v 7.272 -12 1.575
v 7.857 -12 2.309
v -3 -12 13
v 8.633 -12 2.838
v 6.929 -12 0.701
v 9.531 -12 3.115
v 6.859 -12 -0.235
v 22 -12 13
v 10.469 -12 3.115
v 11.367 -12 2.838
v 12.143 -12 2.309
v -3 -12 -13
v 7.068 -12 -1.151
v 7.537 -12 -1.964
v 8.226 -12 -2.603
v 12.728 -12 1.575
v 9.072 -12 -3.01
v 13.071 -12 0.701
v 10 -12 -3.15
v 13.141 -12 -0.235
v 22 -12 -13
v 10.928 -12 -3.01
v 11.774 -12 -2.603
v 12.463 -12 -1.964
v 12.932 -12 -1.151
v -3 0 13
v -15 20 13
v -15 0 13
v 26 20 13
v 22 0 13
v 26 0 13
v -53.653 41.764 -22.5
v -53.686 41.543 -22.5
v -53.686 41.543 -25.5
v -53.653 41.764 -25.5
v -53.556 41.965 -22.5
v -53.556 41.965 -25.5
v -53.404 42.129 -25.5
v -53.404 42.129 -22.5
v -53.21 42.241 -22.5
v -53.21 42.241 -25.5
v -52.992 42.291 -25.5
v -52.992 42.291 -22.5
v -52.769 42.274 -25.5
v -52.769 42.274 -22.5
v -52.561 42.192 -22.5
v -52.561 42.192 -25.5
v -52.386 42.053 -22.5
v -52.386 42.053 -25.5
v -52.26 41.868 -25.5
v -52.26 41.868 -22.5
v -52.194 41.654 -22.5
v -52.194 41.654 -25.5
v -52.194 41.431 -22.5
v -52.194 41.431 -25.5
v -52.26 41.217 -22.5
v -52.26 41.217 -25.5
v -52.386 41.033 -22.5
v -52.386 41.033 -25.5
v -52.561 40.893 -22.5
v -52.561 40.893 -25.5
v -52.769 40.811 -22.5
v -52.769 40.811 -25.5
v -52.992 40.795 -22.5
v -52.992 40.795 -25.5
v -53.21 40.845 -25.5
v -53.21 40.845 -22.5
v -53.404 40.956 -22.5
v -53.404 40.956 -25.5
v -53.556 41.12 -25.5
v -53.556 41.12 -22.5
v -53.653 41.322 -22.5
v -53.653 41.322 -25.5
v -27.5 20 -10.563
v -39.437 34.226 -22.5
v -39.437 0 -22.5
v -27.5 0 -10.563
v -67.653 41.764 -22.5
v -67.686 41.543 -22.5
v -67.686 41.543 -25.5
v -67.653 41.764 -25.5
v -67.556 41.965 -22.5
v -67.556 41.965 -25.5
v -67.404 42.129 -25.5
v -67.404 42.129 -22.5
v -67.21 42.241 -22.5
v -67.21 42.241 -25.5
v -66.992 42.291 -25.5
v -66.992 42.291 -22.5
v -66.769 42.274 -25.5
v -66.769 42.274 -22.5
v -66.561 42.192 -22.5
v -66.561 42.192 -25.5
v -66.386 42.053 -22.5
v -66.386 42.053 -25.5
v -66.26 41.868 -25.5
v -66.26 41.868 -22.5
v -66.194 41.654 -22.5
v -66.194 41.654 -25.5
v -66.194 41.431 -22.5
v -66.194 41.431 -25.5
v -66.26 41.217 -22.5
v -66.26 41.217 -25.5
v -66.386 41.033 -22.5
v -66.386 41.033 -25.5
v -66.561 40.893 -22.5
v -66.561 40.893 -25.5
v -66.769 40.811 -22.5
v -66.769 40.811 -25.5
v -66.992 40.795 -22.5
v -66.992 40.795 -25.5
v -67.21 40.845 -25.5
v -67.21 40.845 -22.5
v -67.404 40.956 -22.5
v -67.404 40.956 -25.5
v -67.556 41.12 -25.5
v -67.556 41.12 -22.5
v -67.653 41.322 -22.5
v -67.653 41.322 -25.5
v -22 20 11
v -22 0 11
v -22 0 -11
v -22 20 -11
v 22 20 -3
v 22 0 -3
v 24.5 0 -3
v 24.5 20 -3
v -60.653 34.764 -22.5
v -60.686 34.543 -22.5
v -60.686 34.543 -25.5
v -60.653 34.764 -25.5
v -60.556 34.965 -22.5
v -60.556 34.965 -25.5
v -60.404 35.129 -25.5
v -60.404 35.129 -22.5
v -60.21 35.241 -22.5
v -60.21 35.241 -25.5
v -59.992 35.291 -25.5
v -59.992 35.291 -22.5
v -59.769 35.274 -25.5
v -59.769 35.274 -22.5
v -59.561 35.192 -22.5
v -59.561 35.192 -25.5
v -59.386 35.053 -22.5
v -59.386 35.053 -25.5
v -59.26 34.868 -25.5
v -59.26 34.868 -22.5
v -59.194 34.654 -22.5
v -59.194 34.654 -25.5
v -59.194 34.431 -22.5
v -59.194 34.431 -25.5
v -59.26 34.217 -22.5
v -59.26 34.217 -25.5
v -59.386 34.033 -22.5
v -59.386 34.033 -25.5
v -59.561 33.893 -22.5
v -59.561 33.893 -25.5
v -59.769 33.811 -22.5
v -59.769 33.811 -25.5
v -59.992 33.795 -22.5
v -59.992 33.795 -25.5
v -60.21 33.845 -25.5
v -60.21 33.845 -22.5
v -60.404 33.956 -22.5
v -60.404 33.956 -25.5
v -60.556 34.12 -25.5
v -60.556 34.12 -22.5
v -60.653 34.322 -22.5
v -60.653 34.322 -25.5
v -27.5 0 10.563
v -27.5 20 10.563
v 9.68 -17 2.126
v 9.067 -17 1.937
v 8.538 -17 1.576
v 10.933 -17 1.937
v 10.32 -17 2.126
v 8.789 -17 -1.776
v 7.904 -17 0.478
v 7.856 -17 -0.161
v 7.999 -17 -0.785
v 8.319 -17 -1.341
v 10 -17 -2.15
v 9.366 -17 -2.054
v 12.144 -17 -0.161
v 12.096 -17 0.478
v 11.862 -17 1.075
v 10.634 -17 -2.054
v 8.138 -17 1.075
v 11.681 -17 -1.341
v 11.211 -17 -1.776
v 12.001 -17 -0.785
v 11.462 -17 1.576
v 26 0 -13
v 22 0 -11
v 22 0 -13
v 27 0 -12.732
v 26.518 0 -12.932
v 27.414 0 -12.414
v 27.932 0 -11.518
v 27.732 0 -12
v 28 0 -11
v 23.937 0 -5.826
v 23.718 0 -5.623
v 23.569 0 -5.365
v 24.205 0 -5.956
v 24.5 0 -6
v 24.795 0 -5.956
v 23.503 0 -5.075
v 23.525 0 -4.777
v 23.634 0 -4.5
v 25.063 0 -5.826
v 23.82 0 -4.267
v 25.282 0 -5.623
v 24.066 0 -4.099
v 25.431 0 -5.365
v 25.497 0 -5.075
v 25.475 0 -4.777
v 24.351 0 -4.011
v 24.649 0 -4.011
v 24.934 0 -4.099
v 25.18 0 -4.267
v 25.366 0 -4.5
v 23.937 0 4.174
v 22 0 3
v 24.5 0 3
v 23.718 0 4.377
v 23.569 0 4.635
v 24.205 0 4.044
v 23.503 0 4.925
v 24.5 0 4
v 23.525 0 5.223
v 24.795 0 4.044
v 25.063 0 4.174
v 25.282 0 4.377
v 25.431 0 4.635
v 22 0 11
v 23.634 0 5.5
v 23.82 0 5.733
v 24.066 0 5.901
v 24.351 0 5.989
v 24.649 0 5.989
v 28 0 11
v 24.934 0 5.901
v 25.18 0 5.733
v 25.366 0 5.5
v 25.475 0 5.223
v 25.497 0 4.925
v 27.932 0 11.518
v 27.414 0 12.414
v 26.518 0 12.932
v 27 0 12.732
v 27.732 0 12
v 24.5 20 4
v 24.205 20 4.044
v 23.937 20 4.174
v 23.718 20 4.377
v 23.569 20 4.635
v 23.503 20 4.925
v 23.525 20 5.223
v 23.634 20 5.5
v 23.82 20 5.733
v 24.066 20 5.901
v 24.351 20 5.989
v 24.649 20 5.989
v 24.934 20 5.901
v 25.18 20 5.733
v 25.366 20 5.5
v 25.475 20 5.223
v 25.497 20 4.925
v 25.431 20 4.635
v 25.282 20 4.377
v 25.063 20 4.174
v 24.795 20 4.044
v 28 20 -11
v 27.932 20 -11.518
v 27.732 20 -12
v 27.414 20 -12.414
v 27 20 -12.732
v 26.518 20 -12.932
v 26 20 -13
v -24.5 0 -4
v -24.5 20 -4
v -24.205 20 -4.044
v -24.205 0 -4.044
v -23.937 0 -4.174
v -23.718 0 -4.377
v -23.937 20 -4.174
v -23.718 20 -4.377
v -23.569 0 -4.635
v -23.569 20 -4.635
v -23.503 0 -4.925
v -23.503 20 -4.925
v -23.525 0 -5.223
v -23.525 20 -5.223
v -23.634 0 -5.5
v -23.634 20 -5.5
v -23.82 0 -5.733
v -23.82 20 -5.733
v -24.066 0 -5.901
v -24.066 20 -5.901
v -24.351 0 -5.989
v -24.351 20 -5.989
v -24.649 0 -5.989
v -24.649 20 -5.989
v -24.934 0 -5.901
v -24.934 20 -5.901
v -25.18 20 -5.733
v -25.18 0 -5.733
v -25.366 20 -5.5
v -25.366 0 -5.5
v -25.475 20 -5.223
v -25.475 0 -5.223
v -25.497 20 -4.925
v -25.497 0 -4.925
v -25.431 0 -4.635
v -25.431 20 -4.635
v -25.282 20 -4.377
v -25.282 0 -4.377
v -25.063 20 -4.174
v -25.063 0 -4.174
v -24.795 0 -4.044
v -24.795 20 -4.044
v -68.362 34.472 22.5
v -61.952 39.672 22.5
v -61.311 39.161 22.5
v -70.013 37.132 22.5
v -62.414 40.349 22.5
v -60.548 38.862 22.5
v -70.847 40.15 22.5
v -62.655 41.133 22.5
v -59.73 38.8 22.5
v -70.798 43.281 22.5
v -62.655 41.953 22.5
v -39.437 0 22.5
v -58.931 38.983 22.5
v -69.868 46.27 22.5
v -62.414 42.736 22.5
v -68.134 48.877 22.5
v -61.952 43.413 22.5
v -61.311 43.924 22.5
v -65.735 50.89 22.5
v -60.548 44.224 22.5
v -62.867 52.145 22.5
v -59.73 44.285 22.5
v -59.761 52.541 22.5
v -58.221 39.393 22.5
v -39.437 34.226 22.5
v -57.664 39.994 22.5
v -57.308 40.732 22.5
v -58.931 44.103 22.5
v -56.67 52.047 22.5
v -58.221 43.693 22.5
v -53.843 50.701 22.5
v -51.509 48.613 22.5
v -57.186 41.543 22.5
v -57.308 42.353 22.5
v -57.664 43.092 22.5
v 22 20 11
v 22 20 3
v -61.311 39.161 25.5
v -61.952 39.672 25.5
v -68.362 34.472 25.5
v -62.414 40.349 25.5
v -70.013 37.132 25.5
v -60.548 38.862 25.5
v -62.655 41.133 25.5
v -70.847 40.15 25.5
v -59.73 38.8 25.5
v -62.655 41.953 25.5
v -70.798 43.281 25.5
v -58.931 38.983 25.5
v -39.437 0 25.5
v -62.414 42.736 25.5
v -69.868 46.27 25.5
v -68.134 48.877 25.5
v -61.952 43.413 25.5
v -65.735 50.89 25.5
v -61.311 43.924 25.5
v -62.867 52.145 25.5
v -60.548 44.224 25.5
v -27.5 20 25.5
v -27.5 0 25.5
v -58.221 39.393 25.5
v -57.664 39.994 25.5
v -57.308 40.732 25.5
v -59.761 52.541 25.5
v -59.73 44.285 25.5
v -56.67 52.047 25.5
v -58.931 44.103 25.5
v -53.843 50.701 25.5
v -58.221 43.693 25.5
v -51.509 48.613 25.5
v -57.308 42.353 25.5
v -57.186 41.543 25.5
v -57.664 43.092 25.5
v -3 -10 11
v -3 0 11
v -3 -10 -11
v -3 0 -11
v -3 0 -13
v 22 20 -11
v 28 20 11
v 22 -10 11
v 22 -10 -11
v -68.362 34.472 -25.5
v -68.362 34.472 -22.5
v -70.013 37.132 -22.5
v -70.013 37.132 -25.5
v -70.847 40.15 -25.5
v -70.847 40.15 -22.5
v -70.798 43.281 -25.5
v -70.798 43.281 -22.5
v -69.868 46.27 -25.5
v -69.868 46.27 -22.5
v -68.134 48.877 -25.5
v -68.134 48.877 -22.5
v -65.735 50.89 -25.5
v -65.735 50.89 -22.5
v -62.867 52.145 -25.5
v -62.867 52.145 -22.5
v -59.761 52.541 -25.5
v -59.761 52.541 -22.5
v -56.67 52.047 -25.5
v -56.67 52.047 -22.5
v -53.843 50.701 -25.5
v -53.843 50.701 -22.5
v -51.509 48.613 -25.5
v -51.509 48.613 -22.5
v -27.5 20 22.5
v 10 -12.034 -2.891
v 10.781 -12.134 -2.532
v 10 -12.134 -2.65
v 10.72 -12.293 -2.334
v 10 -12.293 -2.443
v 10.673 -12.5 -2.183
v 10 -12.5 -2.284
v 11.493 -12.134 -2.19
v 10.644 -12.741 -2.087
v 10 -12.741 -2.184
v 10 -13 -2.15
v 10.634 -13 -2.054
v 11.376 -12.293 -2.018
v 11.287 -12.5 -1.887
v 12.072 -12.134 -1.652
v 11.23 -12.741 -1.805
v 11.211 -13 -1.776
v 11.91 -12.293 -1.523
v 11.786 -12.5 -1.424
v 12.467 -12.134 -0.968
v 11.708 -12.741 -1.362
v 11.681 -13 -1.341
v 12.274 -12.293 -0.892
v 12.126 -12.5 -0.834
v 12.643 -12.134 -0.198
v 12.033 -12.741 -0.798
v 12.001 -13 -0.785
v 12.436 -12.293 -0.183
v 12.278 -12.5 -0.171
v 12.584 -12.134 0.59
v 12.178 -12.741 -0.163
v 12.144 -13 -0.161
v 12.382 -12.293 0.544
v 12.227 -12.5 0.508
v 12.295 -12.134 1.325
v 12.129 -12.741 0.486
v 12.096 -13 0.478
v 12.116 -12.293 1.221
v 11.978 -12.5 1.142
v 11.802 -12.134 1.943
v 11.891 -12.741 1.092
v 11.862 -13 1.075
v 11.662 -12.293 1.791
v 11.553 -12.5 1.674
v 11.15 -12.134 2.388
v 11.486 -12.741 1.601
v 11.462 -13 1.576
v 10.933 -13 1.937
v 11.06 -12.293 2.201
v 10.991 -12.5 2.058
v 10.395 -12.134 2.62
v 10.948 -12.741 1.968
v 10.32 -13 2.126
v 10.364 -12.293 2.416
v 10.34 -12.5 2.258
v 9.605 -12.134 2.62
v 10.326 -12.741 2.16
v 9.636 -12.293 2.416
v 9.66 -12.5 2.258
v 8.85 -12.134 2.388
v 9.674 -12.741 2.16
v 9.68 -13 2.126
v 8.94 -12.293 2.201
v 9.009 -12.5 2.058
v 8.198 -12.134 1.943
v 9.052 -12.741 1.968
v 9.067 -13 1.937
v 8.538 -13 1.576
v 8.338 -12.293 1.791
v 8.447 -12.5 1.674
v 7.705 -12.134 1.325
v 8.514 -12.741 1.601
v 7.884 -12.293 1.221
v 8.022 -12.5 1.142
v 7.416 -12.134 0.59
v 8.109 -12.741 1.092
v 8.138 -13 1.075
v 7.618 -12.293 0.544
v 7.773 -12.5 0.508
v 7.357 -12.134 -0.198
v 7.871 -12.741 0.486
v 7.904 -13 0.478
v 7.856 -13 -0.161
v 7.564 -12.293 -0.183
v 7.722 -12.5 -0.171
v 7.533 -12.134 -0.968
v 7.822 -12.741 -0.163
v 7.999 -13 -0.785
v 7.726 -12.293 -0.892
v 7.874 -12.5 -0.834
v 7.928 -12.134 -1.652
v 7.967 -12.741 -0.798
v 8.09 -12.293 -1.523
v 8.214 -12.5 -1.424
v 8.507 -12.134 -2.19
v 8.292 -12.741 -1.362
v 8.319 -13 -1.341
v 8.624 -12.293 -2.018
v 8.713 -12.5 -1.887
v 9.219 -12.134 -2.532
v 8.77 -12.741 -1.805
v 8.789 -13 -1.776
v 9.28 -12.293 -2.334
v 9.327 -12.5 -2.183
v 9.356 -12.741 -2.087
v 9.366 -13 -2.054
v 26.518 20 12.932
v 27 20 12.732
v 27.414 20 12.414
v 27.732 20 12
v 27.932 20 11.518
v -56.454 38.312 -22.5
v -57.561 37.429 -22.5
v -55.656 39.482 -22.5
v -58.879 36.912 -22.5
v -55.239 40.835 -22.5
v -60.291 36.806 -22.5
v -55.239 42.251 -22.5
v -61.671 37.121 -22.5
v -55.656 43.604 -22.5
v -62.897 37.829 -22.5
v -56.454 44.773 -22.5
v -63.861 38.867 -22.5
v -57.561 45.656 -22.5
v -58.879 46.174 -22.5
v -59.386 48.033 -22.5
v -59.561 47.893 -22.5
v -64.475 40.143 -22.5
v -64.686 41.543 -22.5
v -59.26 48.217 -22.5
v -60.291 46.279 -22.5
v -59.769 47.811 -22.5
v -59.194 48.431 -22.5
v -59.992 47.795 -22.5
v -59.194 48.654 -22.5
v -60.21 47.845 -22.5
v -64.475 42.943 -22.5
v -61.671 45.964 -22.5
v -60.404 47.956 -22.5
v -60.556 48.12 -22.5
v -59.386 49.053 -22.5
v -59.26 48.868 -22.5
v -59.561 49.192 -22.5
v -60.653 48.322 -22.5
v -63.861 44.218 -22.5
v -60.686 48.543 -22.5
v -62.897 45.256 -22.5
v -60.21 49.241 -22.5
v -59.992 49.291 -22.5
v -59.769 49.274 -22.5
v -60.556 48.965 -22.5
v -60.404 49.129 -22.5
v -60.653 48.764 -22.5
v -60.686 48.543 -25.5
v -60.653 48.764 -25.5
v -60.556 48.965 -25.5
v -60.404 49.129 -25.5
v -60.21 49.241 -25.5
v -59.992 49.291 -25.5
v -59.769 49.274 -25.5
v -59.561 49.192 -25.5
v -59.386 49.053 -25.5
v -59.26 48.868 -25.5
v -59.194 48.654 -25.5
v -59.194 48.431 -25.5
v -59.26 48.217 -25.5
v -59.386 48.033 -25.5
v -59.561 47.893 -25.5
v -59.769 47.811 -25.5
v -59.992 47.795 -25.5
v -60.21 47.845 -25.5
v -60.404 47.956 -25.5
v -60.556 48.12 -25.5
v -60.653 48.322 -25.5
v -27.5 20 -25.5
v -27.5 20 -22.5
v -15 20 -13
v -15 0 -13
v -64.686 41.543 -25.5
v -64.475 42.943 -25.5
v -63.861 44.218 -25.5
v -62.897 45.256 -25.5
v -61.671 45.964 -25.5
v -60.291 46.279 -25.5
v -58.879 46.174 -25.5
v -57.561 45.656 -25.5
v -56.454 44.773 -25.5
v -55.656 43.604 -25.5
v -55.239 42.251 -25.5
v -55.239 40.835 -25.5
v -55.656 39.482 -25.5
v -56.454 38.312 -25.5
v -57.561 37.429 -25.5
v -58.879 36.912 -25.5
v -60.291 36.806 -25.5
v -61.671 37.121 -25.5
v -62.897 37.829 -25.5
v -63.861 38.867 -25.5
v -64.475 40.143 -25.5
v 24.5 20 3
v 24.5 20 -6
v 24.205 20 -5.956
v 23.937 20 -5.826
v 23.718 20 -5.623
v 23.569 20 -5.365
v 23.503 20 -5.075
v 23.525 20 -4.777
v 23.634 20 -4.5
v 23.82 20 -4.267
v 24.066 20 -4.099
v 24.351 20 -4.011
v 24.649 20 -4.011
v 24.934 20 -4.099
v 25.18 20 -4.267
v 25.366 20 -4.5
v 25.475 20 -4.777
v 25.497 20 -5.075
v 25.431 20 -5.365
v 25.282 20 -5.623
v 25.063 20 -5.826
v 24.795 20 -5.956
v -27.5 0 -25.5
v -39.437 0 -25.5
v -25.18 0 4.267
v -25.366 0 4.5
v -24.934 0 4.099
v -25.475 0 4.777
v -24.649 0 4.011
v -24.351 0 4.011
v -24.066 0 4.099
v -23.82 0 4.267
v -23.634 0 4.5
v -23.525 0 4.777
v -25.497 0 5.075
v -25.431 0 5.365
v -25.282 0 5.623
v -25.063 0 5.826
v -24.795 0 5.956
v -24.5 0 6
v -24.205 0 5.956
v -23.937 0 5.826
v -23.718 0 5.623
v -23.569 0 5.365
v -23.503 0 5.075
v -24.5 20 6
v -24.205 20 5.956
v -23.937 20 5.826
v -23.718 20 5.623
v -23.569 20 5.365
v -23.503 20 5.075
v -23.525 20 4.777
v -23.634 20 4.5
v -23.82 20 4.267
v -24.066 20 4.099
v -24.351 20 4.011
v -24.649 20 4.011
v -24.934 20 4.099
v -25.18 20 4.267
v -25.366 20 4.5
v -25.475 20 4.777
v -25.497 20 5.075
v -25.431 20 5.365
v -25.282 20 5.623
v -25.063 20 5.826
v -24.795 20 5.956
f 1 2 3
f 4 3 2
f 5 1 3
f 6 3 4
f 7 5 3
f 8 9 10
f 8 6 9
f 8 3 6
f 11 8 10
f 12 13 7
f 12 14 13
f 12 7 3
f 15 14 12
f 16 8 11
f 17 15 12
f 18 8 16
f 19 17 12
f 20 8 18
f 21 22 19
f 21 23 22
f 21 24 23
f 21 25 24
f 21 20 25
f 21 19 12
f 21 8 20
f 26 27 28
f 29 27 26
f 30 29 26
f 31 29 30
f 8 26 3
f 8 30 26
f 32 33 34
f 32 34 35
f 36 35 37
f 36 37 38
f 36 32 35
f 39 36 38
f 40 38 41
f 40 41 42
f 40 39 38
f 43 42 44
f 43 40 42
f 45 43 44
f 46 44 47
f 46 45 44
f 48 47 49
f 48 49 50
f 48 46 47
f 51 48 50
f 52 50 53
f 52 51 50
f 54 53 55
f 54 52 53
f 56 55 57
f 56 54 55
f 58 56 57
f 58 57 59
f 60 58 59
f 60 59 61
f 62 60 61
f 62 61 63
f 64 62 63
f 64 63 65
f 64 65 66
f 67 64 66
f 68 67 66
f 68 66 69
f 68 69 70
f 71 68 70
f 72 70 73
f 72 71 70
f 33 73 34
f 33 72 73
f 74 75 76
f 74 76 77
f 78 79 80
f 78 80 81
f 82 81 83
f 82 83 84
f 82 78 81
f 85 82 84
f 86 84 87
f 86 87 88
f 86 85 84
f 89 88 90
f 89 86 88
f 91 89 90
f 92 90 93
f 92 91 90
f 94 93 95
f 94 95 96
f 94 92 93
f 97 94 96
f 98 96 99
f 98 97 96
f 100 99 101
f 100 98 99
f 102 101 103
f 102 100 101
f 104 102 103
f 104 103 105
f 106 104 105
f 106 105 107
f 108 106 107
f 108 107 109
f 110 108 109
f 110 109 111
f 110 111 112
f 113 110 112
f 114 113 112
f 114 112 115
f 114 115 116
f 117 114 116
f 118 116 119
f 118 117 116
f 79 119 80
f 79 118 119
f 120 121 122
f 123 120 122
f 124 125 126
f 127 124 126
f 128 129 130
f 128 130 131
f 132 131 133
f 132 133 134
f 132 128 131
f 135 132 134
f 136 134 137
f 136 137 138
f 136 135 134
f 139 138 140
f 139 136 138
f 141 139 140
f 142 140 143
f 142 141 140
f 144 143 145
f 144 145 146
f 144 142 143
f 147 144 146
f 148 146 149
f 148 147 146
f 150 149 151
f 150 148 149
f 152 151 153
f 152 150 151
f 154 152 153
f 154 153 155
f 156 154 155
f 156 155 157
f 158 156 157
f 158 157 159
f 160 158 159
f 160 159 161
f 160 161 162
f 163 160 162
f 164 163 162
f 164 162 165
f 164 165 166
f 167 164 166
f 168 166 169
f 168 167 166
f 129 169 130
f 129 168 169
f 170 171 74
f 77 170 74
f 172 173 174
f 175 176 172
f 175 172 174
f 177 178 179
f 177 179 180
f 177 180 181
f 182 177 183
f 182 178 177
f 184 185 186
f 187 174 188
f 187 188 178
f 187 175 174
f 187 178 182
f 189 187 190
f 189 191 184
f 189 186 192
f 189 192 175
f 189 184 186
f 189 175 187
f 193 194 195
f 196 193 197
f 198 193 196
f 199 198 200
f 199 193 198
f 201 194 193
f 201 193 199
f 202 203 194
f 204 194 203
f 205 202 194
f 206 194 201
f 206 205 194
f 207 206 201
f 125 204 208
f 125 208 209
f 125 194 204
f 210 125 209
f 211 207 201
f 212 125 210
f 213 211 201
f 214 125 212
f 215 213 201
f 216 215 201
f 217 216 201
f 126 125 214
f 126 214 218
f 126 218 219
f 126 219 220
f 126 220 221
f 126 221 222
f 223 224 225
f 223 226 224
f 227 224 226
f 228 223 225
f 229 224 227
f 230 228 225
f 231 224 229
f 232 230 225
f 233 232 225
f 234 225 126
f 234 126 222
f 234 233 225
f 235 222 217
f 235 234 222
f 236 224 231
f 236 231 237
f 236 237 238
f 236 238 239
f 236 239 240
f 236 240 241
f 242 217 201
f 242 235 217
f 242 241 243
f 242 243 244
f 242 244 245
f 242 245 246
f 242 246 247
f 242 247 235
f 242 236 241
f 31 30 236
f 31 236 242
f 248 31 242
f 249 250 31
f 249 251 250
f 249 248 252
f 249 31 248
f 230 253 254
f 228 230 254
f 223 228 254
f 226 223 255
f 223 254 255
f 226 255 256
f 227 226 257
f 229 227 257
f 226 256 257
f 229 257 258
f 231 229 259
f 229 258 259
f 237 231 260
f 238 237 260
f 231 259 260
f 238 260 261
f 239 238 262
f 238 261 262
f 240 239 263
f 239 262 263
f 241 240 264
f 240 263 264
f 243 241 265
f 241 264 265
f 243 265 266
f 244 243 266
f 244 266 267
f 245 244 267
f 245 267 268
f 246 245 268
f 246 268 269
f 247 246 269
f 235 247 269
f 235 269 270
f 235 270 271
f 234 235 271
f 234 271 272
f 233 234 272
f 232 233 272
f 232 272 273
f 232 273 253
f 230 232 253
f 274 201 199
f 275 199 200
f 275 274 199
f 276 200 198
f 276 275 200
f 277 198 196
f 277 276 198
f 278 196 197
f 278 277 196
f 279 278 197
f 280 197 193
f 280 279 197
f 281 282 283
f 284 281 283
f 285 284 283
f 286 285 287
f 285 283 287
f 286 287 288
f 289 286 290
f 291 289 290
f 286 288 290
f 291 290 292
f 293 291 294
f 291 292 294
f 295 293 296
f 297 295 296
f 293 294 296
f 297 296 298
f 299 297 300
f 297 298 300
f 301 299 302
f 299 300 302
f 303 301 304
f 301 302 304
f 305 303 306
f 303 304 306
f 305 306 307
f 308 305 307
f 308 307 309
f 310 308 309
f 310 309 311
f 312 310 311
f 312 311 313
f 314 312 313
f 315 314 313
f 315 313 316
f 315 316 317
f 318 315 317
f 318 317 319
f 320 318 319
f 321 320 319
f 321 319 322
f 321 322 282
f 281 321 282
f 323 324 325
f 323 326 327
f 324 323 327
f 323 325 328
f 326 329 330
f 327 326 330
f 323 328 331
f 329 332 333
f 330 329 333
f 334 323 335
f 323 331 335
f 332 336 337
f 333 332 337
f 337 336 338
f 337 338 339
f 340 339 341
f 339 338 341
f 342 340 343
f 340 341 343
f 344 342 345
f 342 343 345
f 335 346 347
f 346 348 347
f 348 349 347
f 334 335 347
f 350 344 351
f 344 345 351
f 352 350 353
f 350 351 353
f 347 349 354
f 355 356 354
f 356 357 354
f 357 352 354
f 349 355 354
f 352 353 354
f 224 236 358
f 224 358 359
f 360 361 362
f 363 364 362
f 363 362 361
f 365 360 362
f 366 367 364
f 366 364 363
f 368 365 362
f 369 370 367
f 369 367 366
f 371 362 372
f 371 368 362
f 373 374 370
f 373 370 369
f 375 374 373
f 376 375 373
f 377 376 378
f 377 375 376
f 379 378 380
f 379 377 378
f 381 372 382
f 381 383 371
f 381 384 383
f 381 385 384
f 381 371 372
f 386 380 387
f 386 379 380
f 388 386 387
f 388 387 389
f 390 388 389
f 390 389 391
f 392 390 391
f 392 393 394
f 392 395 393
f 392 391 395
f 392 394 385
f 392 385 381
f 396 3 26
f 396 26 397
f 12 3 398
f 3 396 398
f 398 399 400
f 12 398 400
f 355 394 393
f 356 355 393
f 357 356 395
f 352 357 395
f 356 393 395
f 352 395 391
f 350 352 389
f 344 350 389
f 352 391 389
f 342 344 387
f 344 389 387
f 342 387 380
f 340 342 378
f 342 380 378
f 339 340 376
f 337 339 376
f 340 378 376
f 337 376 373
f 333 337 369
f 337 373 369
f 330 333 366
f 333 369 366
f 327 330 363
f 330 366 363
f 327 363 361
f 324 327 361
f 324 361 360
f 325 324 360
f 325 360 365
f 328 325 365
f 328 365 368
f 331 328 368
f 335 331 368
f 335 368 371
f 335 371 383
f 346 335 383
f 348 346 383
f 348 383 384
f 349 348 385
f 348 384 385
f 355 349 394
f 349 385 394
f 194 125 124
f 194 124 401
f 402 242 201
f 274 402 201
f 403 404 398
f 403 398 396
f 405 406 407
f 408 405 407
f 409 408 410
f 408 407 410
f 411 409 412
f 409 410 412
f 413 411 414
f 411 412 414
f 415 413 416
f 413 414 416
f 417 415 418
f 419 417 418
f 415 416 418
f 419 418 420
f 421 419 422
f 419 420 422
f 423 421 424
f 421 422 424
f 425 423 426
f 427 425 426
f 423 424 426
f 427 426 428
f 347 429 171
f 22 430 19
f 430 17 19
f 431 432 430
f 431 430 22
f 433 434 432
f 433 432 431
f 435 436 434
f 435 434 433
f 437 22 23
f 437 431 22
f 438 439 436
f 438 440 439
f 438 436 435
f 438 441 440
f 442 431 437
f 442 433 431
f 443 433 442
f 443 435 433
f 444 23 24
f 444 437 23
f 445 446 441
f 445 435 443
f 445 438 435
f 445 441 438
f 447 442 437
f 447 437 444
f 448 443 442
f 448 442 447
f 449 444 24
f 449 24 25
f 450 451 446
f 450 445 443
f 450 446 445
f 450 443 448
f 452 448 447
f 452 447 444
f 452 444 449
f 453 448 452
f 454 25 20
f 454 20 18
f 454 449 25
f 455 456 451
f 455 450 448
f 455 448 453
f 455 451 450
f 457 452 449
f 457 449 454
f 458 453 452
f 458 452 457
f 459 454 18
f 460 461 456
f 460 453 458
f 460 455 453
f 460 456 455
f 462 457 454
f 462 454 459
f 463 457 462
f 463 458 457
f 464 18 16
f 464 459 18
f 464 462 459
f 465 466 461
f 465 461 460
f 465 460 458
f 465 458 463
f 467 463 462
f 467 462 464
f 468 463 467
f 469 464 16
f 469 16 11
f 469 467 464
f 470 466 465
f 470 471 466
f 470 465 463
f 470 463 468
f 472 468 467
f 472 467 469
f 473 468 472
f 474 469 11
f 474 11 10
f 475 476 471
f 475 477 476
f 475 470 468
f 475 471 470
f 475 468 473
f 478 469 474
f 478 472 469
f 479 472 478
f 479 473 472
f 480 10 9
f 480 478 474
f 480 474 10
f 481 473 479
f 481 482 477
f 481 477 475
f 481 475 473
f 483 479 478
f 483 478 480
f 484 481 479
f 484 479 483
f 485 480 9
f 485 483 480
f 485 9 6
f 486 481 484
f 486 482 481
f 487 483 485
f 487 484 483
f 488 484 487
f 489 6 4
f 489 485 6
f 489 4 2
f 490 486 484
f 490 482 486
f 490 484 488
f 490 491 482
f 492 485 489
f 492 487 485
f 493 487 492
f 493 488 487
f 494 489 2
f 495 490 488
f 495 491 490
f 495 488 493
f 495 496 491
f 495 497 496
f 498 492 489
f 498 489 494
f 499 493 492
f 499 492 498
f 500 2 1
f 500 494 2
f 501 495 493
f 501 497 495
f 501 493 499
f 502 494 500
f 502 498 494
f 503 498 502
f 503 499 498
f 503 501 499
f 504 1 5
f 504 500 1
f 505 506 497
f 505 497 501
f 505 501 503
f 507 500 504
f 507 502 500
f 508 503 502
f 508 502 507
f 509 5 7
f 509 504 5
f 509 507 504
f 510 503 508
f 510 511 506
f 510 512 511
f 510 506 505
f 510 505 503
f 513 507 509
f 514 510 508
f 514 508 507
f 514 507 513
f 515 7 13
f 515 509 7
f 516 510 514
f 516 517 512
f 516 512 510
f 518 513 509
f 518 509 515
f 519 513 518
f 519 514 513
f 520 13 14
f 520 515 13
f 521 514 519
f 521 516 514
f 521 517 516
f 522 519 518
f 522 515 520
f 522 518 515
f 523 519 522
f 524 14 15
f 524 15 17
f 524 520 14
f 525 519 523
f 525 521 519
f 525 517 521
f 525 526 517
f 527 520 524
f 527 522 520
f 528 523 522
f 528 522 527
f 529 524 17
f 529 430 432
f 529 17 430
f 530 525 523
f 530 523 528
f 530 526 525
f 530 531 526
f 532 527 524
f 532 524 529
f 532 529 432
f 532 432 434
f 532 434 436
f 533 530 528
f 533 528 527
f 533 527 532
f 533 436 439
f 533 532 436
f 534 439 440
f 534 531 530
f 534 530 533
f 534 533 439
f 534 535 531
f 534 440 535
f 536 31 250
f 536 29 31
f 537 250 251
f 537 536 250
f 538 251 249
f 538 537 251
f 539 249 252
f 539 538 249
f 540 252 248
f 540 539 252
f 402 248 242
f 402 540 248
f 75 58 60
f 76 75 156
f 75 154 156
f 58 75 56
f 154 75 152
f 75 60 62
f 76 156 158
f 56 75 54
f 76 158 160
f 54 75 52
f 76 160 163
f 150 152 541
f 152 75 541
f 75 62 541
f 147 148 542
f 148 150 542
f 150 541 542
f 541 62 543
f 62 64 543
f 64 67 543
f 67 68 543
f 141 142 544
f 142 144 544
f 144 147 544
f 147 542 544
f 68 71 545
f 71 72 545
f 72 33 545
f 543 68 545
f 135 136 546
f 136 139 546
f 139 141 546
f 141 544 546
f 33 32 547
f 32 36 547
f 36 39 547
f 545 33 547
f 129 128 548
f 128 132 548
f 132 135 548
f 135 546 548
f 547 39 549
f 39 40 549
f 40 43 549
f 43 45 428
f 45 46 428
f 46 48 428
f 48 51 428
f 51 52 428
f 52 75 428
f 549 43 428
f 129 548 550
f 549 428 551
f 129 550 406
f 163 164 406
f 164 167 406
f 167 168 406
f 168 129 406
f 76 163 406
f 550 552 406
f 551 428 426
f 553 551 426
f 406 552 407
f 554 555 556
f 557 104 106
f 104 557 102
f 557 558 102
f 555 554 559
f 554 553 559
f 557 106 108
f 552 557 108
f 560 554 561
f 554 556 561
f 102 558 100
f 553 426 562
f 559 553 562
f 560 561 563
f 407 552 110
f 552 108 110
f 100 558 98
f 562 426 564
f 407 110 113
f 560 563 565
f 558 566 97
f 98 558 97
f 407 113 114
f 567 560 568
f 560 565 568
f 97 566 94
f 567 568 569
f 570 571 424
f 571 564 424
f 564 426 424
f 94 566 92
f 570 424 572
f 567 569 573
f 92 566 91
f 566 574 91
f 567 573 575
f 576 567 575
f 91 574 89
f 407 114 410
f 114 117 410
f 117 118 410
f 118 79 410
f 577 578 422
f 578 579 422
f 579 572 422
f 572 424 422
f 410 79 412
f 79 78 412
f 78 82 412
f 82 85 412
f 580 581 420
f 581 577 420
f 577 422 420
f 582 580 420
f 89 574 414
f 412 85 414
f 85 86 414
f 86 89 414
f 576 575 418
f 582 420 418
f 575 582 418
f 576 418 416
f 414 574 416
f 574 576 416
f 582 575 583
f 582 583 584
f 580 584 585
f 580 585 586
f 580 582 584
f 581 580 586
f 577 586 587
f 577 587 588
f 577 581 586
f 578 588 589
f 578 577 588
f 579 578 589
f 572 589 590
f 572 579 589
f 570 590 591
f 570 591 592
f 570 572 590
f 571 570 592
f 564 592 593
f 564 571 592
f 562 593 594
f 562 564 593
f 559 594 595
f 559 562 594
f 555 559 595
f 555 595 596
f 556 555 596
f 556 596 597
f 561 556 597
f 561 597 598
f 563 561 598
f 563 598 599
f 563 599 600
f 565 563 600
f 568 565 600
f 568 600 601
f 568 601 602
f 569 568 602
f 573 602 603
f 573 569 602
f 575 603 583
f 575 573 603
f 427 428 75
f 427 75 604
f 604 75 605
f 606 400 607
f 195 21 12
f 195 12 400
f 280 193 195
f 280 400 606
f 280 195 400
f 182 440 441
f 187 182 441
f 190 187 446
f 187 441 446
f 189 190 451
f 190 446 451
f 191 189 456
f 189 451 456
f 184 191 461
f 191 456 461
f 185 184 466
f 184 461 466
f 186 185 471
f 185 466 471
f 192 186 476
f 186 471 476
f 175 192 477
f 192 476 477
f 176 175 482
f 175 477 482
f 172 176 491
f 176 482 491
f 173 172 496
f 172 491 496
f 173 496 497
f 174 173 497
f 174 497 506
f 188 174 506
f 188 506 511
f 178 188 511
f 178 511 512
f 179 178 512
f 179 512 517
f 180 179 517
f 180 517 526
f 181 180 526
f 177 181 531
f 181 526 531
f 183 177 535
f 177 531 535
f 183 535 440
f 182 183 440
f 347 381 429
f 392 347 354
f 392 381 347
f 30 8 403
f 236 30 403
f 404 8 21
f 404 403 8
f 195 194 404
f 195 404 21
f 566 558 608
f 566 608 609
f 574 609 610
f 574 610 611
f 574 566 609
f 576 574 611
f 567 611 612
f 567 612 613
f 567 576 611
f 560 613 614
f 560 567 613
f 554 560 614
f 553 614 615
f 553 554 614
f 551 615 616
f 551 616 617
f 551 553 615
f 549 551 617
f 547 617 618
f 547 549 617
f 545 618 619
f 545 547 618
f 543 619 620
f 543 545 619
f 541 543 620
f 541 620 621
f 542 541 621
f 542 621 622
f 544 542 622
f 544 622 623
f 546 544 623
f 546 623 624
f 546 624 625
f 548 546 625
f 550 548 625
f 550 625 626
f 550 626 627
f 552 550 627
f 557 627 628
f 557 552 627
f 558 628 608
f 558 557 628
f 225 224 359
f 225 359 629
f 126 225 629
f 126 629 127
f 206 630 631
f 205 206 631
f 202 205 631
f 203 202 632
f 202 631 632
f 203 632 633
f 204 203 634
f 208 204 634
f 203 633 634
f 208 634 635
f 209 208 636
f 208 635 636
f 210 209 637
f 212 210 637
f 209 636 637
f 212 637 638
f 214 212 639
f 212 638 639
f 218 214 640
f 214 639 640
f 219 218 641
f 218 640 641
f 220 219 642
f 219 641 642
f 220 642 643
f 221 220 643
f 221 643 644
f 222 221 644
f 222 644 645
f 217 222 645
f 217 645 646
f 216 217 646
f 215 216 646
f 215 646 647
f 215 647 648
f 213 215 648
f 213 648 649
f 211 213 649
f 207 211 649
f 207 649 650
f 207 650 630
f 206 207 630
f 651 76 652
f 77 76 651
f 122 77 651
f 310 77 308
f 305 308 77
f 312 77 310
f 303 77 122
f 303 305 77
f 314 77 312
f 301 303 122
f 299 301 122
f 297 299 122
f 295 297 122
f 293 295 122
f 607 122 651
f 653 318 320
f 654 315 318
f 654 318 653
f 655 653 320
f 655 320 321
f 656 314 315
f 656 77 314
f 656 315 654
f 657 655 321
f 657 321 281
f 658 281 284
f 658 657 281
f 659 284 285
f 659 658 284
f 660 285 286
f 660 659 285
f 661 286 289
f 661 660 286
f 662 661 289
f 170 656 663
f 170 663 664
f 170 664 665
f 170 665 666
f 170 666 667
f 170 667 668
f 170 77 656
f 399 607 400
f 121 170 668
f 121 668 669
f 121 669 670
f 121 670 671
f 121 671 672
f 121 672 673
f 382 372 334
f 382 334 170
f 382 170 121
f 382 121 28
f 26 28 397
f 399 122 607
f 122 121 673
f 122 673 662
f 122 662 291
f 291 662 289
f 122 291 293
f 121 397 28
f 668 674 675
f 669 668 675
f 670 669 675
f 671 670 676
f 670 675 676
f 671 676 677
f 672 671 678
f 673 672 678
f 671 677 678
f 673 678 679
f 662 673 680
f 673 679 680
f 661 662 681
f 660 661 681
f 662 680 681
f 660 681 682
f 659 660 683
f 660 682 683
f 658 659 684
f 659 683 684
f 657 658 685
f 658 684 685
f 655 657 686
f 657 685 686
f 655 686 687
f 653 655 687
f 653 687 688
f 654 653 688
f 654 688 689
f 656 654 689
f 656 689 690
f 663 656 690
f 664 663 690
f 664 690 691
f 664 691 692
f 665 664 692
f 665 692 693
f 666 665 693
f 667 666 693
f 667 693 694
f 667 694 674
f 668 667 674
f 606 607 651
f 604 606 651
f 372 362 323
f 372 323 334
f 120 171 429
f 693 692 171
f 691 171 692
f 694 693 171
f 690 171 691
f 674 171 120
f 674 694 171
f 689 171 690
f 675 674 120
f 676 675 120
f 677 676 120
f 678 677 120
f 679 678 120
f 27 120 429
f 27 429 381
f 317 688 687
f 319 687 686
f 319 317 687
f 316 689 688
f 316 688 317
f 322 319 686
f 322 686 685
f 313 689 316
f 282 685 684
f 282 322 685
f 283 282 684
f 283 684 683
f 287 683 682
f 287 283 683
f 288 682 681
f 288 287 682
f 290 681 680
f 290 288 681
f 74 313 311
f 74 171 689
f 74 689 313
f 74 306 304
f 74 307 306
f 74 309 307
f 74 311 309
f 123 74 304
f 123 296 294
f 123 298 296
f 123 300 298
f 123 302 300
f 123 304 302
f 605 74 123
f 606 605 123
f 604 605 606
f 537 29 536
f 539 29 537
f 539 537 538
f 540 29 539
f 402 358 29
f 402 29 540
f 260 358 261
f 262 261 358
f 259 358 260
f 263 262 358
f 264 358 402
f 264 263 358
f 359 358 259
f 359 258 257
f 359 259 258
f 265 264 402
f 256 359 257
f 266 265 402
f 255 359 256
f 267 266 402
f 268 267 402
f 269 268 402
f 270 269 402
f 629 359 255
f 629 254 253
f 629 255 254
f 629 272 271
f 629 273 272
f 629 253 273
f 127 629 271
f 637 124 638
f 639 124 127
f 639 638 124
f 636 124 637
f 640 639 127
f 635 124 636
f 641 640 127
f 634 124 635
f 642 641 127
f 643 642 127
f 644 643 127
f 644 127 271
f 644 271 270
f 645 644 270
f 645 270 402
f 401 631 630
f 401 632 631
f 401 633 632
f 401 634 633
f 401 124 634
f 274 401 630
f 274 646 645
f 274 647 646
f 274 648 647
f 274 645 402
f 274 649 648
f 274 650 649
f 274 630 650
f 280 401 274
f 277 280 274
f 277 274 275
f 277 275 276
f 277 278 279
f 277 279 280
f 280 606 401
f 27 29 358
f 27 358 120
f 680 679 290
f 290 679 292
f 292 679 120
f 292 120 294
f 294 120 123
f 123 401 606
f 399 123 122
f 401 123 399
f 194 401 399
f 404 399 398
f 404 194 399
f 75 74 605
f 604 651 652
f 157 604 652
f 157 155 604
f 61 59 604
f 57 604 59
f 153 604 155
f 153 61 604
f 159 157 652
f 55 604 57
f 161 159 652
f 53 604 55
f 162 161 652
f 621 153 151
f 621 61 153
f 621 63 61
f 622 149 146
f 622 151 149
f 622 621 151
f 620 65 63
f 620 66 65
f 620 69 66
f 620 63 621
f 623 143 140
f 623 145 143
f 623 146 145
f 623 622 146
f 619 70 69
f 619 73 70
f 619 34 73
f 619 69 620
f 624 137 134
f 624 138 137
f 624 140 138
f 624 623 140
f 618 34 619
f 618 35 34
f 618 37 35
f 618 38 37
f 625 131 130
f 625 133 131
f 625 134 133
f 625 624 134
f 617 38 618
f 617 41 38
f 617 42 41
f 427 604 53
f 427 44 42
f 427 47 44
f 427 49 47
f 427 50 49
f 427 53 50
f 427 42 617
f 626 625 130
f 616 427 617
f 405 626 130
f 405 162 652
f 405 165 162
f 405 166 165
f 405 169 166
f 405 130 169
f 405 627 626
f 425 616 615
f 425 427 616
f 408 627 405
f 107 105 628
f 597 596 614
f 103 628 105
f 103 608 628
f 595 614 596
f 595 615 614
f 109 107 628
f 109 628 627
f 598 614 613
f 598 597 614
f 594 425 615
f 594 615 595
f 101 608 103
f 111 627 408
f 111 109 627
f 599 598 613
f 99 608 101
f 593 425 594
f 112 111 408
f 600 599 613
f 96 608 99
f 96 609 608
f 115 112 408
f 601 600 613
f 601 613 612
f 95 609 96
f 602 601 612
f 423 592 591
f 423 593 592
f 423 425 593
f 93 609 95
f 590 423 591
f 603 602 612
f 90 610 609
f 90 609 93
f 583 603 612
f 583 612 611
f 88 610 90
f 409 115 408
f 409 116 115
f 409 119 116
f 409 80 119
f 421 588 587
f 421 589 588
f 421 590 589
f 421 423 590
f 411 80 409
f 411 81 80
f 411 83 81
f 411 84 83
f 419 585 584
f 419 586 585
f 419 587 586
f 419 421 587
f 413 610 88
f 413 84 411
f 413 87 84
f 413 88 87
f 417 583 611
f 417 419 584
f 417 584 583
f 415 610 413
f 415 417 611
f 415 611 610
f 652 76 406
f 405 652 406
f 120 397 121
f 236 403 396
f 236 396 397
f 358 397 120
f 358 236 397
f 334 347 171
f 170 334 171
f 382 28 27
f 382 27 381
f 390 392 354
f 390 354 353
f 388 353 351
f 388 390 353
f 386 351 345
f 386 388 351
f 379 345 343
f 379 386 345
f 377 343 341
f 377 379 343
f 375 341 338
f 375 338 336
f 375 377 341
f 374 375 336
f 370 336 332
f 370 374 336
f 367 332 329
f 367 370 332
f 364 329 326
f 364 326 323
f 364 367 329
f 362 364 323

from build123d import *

# Parameters (mm, degrees)
CROQUIS2_W              = 58
CROQUIS2_H              = 26
CROQUIS2_W_2            = 44
CROQUIS2_H_2            = 22
SALIENTE_EXTRUIR3_DEPTH = 20
CROQUIS4_R              = 1
CROQUIS4_W              = 2.5
CROQUIS4_H              = 6
CUT_EXTRUDE1_DEPTH      = 39.327535793
SKETCH1_W               = 51
SKETCH1_H               = 20
BOSS_EXTRUDE1_DEPTH     = 2.5
CROQUIS6_R              = 2.75
SALIENTE_EXTRUIR5_DEPTH = 3
BOSS_EXTRUDE2_START     = -3
SKETCH3_R               = 0.75
SKETCH3_R_2             = 4.75
BOSS_EXTRUDE2_DEPTH     = 3
BOSS_EXTRUDE3_DEPTH     = 25
FILLET1_R               = 2
SKETCH6_R               = 2.15
BOSS_EXTRUDE4_DEPTH     = 5
FILLET4_R               = 1
BOSS_EXTRUDE5_DEPTH     = 20
BOSS_EXTRUDE6_REACH     = 93.885
CUT_EXTRUDE2_DEPTH      = 84.971155352


with BuildPart() as part:
    # Croquis2 → Saliente-Extruir3 (new body)
    with BuildSketch(Plane(origin=(0, 0, 0), x_dir=(1, 0, 0), z_dir=(0, 1, 0))):
        with Locations((-1, 0)):
            Rectangle(CROQUIS2_W, CROQUIS2_H)
        Rectangle(CROQUIS2_W_2, CROQUIS2_H_2, mode=Mode.SUBTRACT)
    extrude(amount=SALIENTE_EXTRUIR3_DEPTH)

    # Croquis4 → Cut-Extrude1 (cut, through all)
    with BuildSketch(Plane(origin=(0, 20, 0), x_dir=(1, 0, 0), z_dir=(0, 1, 0))):
        with Locations(Location((-24.5, 5, 0), (0, 0, 270))):
            Circle(CROQUIS4_R)
        with Locations(Location((-24.5, -5, 0), (0, 0, 270))):
            Circle(CROQUIS4_R)
        with Locations(Location((24.5, -5, 0), (0, 0, 90))):
            Circle(CROQUIS4_R)
        with Locations(Location((24.5, 5, 0), (0, 0, 90))):
            Circle(CROQUIS4_R)
        with Locations((23.25, 0)):
            Rectangle(CROQUIS4_W, CROQUIS4_H)
    extrude(amount=-CUT_EXTRUDE1_DEPTH, mode=Mode.SUBTRACT)

    # Sketch1 → Boss-Extrude1 (add)
    with BuildSketch(Plane.ZY.offset(30)):
        with Locations((0, 10)):
            Rectangle(SKETCH1_W, SKETCH1_H)
    extrude(amount=-BOSS_EXTRUDE1_DEPTH)

    # Croquis6 → Saliente-Extruir5 (add)
    with BuildSketch(Plane.XY.offset(25.5)):
        with BuildLine():
            Line((-39.436967742, 0), (-30, 0))
            Line((-30, 0), (-30, 20))
            Line((-30, 20), (-27.5, 20))
            Line((-27.5, 20), (-51.509432429, 48.613327353))
            ThreePointArc((-51.509432429, 48.613327353), (-67.00658501, 49.969152521), (-68.362410178, 34.47199994))
            Line((-68.362410178, 34.47199994), (-39.436967742, 0))
        make_face()
        with Locations((-59.935921303, 41.542663647)):
            Circle(CROQUIS6_R, mode=Mode.SUBTRACT)
    extrude(amount=-SALIENTE_EXTRUIR5_DEPTH)

    # Sketch3 → Boss-Extrude2 (add)
    with BuildSketch(Plane(origin=(0, 0, -25.5), x_dir=(-1, 0, 0), z_dir=(0, 0, -1)).offset(BOSS_EXTRUDE2_START)):
        with BuildLine():
            Line((51.509432429, 48.613327353), (27.5, 20))
            Line((27.5, 20), (30, 20))
            Line((30, 20), (30, 0))
            Line((30, 0), (39.436967742, 0))
            Line((39.436967742, 0), (68.362410178, 34.47199994))
            ThreePointArc((68.362410178, 34.47199994), (67.00658501, 49.969152521), (51.509432429, 48.613327353))
        make_face()
        with Locations((66.935921303, 41.542663647)):
            Circle(SKETCH3_R, mode=Mode.SUBTRACT)
        with Locations((59.935921303, 34.542663647)):
            Circle(SKETCH3_R, mode=Mode.SUBTRACT)
        with Locations((59.935921303, 48.542663647)):
            Circle(SKETCH3_R, mode=Mode.SUBTRACT)
        with Locations((52.935921303, 41.542663647)):
            Circle(SKETCH3_R, mode=Mode.SUBTRACT)
        with Locations((59.935921303, 41.542663647)):
            Circle(SKETCH3_R_2, mode=Mode.SUBTRACT)
    extrude(amount=BOSS_EXTRUDE2_DEPTH)

    # Sketch5 → Boss-Extrude3 (add)
    with BuildSketch(Plane(origin=(22, 0, 0), x_dir=(0, 0, -1), z_dir=(1, 0, 0))):
        Polygon((-13, 0), (-13, -12), (13, -12), (13, 0), (11, 0), (11, -10), (-11, -10), (-11, 0), align=None)
    extrude(amount=-BOSS_EXTRUDE3_DEPTH)

    # Fillet1
    fillet1_edges = [part.edges().sort_by_distance(p)[0] for p in [
        (28, 10, -13),
        (28, 10, 13),
    ]]
    fillet(fillet1_edges, radius=FILLET1_R)

    # Sketch6 → Boss-Extrude4 (add)
    with BuildSketch(Plane.XZ.offset(12)):
        with Locations(Location((10, 0, 0), (0, 0, 270))):
            Circle(SKETCH6_R)
    extrude(amount=BOSS_EXTRUDE4_DEPTH)

    # Fillet4
    fillet4_edges = [part.edges().sort_by_distance(p)[0] for p in [
        (10, -12, 2.15),
    ]]
    fillet(fillet4_edges, radius=FILLET4_R)

    # Sketch8 → Boss-Extrude5 (add)
    with BuildSketch(Plane(origin=(0, 20, 0), x_dir=(1, 0, 0), z_dir=(0, 1, 0))):
        Polygon((-27.5, 25.5), (-27.5, 13), (-15, 13), align=None)
        Polygon((-27.5, -13), (-15, -13), (-27.5, -25.5), align=None)
    extrude(amount=-BOSS_EXTRUDE5_DEPTH)

    # Boss-Extrude6: up to this plane
    boss_extrude6_end = Plane(origin=(-6.289584913, -5.277588381, 22.5), z_dir=(0.76604444311898, 0.642787609686537, 0))
    # Sketch9 → Boss-Extrude6 (add, up to the surface)
    with BuildSketch(Plane.XZ, mode=Mode.PRIVATE) as boss_extrude6_sk1:
        Polygon((-39.436967742, 22.5), (-26.5, 9.563032258), (-26.5, 22.5), align=None)
    boss_extrude6_tool1 = split(extrude(boss_extrude6_sk1.sketch, amount=-BOSS_EXTRUDE6_REACH, mode=Mode.PRIVATE), bisect_by=boss_extrude6_end, keep=Keep.BOTH, mode=Mode.PRIVATE)
    add(boss_extrude6_tool1.solids().sort_by_distance((-30.812323, 0, 18.187677))[0])
    # Sketch9 → Boss-Extrude6 (add, up to the surface)
    with BuildSketch(Plane.XZ, mode=Mode.PRIVATE) as boss_extrude6_sk2:
        Polygon((-26.5, -9.563032258), (-26.5, -22.5), (-39.436967742, -22.5), align=None)
    boss_extrude6_tool2 = split(extrude(boss_extrude6_sk2.sketch, amount=-BOSS_EXTRUDE6_REACH, mode=Mode.PRIVATE), bisect_by=boss_extrude6_end, keep=Keep.BOTH, mode=Mode.PRIVATE)
    add(boss_extrude6_tool2.solids().sort_by_distance((-30.812323, 0, -18.187677))[0])

    # Sketch10 → Cut-Extrude2 (cut, through all)
    with BuildSketch(Plane(origin=(0, 20, 0), x_dir=(1, 0, 0), z_dir=(0, 1, 0))):
        Polygon((-30, 13.063032258), (-30, -13.063032258), (-27.5, -10.563032258), (-27.5, 10.563032258), align=None)
    extrude(amount=-CUT_EXTRUDE2_DEPTH, mode=Mode.SUBTRACT)


solid = part.part
